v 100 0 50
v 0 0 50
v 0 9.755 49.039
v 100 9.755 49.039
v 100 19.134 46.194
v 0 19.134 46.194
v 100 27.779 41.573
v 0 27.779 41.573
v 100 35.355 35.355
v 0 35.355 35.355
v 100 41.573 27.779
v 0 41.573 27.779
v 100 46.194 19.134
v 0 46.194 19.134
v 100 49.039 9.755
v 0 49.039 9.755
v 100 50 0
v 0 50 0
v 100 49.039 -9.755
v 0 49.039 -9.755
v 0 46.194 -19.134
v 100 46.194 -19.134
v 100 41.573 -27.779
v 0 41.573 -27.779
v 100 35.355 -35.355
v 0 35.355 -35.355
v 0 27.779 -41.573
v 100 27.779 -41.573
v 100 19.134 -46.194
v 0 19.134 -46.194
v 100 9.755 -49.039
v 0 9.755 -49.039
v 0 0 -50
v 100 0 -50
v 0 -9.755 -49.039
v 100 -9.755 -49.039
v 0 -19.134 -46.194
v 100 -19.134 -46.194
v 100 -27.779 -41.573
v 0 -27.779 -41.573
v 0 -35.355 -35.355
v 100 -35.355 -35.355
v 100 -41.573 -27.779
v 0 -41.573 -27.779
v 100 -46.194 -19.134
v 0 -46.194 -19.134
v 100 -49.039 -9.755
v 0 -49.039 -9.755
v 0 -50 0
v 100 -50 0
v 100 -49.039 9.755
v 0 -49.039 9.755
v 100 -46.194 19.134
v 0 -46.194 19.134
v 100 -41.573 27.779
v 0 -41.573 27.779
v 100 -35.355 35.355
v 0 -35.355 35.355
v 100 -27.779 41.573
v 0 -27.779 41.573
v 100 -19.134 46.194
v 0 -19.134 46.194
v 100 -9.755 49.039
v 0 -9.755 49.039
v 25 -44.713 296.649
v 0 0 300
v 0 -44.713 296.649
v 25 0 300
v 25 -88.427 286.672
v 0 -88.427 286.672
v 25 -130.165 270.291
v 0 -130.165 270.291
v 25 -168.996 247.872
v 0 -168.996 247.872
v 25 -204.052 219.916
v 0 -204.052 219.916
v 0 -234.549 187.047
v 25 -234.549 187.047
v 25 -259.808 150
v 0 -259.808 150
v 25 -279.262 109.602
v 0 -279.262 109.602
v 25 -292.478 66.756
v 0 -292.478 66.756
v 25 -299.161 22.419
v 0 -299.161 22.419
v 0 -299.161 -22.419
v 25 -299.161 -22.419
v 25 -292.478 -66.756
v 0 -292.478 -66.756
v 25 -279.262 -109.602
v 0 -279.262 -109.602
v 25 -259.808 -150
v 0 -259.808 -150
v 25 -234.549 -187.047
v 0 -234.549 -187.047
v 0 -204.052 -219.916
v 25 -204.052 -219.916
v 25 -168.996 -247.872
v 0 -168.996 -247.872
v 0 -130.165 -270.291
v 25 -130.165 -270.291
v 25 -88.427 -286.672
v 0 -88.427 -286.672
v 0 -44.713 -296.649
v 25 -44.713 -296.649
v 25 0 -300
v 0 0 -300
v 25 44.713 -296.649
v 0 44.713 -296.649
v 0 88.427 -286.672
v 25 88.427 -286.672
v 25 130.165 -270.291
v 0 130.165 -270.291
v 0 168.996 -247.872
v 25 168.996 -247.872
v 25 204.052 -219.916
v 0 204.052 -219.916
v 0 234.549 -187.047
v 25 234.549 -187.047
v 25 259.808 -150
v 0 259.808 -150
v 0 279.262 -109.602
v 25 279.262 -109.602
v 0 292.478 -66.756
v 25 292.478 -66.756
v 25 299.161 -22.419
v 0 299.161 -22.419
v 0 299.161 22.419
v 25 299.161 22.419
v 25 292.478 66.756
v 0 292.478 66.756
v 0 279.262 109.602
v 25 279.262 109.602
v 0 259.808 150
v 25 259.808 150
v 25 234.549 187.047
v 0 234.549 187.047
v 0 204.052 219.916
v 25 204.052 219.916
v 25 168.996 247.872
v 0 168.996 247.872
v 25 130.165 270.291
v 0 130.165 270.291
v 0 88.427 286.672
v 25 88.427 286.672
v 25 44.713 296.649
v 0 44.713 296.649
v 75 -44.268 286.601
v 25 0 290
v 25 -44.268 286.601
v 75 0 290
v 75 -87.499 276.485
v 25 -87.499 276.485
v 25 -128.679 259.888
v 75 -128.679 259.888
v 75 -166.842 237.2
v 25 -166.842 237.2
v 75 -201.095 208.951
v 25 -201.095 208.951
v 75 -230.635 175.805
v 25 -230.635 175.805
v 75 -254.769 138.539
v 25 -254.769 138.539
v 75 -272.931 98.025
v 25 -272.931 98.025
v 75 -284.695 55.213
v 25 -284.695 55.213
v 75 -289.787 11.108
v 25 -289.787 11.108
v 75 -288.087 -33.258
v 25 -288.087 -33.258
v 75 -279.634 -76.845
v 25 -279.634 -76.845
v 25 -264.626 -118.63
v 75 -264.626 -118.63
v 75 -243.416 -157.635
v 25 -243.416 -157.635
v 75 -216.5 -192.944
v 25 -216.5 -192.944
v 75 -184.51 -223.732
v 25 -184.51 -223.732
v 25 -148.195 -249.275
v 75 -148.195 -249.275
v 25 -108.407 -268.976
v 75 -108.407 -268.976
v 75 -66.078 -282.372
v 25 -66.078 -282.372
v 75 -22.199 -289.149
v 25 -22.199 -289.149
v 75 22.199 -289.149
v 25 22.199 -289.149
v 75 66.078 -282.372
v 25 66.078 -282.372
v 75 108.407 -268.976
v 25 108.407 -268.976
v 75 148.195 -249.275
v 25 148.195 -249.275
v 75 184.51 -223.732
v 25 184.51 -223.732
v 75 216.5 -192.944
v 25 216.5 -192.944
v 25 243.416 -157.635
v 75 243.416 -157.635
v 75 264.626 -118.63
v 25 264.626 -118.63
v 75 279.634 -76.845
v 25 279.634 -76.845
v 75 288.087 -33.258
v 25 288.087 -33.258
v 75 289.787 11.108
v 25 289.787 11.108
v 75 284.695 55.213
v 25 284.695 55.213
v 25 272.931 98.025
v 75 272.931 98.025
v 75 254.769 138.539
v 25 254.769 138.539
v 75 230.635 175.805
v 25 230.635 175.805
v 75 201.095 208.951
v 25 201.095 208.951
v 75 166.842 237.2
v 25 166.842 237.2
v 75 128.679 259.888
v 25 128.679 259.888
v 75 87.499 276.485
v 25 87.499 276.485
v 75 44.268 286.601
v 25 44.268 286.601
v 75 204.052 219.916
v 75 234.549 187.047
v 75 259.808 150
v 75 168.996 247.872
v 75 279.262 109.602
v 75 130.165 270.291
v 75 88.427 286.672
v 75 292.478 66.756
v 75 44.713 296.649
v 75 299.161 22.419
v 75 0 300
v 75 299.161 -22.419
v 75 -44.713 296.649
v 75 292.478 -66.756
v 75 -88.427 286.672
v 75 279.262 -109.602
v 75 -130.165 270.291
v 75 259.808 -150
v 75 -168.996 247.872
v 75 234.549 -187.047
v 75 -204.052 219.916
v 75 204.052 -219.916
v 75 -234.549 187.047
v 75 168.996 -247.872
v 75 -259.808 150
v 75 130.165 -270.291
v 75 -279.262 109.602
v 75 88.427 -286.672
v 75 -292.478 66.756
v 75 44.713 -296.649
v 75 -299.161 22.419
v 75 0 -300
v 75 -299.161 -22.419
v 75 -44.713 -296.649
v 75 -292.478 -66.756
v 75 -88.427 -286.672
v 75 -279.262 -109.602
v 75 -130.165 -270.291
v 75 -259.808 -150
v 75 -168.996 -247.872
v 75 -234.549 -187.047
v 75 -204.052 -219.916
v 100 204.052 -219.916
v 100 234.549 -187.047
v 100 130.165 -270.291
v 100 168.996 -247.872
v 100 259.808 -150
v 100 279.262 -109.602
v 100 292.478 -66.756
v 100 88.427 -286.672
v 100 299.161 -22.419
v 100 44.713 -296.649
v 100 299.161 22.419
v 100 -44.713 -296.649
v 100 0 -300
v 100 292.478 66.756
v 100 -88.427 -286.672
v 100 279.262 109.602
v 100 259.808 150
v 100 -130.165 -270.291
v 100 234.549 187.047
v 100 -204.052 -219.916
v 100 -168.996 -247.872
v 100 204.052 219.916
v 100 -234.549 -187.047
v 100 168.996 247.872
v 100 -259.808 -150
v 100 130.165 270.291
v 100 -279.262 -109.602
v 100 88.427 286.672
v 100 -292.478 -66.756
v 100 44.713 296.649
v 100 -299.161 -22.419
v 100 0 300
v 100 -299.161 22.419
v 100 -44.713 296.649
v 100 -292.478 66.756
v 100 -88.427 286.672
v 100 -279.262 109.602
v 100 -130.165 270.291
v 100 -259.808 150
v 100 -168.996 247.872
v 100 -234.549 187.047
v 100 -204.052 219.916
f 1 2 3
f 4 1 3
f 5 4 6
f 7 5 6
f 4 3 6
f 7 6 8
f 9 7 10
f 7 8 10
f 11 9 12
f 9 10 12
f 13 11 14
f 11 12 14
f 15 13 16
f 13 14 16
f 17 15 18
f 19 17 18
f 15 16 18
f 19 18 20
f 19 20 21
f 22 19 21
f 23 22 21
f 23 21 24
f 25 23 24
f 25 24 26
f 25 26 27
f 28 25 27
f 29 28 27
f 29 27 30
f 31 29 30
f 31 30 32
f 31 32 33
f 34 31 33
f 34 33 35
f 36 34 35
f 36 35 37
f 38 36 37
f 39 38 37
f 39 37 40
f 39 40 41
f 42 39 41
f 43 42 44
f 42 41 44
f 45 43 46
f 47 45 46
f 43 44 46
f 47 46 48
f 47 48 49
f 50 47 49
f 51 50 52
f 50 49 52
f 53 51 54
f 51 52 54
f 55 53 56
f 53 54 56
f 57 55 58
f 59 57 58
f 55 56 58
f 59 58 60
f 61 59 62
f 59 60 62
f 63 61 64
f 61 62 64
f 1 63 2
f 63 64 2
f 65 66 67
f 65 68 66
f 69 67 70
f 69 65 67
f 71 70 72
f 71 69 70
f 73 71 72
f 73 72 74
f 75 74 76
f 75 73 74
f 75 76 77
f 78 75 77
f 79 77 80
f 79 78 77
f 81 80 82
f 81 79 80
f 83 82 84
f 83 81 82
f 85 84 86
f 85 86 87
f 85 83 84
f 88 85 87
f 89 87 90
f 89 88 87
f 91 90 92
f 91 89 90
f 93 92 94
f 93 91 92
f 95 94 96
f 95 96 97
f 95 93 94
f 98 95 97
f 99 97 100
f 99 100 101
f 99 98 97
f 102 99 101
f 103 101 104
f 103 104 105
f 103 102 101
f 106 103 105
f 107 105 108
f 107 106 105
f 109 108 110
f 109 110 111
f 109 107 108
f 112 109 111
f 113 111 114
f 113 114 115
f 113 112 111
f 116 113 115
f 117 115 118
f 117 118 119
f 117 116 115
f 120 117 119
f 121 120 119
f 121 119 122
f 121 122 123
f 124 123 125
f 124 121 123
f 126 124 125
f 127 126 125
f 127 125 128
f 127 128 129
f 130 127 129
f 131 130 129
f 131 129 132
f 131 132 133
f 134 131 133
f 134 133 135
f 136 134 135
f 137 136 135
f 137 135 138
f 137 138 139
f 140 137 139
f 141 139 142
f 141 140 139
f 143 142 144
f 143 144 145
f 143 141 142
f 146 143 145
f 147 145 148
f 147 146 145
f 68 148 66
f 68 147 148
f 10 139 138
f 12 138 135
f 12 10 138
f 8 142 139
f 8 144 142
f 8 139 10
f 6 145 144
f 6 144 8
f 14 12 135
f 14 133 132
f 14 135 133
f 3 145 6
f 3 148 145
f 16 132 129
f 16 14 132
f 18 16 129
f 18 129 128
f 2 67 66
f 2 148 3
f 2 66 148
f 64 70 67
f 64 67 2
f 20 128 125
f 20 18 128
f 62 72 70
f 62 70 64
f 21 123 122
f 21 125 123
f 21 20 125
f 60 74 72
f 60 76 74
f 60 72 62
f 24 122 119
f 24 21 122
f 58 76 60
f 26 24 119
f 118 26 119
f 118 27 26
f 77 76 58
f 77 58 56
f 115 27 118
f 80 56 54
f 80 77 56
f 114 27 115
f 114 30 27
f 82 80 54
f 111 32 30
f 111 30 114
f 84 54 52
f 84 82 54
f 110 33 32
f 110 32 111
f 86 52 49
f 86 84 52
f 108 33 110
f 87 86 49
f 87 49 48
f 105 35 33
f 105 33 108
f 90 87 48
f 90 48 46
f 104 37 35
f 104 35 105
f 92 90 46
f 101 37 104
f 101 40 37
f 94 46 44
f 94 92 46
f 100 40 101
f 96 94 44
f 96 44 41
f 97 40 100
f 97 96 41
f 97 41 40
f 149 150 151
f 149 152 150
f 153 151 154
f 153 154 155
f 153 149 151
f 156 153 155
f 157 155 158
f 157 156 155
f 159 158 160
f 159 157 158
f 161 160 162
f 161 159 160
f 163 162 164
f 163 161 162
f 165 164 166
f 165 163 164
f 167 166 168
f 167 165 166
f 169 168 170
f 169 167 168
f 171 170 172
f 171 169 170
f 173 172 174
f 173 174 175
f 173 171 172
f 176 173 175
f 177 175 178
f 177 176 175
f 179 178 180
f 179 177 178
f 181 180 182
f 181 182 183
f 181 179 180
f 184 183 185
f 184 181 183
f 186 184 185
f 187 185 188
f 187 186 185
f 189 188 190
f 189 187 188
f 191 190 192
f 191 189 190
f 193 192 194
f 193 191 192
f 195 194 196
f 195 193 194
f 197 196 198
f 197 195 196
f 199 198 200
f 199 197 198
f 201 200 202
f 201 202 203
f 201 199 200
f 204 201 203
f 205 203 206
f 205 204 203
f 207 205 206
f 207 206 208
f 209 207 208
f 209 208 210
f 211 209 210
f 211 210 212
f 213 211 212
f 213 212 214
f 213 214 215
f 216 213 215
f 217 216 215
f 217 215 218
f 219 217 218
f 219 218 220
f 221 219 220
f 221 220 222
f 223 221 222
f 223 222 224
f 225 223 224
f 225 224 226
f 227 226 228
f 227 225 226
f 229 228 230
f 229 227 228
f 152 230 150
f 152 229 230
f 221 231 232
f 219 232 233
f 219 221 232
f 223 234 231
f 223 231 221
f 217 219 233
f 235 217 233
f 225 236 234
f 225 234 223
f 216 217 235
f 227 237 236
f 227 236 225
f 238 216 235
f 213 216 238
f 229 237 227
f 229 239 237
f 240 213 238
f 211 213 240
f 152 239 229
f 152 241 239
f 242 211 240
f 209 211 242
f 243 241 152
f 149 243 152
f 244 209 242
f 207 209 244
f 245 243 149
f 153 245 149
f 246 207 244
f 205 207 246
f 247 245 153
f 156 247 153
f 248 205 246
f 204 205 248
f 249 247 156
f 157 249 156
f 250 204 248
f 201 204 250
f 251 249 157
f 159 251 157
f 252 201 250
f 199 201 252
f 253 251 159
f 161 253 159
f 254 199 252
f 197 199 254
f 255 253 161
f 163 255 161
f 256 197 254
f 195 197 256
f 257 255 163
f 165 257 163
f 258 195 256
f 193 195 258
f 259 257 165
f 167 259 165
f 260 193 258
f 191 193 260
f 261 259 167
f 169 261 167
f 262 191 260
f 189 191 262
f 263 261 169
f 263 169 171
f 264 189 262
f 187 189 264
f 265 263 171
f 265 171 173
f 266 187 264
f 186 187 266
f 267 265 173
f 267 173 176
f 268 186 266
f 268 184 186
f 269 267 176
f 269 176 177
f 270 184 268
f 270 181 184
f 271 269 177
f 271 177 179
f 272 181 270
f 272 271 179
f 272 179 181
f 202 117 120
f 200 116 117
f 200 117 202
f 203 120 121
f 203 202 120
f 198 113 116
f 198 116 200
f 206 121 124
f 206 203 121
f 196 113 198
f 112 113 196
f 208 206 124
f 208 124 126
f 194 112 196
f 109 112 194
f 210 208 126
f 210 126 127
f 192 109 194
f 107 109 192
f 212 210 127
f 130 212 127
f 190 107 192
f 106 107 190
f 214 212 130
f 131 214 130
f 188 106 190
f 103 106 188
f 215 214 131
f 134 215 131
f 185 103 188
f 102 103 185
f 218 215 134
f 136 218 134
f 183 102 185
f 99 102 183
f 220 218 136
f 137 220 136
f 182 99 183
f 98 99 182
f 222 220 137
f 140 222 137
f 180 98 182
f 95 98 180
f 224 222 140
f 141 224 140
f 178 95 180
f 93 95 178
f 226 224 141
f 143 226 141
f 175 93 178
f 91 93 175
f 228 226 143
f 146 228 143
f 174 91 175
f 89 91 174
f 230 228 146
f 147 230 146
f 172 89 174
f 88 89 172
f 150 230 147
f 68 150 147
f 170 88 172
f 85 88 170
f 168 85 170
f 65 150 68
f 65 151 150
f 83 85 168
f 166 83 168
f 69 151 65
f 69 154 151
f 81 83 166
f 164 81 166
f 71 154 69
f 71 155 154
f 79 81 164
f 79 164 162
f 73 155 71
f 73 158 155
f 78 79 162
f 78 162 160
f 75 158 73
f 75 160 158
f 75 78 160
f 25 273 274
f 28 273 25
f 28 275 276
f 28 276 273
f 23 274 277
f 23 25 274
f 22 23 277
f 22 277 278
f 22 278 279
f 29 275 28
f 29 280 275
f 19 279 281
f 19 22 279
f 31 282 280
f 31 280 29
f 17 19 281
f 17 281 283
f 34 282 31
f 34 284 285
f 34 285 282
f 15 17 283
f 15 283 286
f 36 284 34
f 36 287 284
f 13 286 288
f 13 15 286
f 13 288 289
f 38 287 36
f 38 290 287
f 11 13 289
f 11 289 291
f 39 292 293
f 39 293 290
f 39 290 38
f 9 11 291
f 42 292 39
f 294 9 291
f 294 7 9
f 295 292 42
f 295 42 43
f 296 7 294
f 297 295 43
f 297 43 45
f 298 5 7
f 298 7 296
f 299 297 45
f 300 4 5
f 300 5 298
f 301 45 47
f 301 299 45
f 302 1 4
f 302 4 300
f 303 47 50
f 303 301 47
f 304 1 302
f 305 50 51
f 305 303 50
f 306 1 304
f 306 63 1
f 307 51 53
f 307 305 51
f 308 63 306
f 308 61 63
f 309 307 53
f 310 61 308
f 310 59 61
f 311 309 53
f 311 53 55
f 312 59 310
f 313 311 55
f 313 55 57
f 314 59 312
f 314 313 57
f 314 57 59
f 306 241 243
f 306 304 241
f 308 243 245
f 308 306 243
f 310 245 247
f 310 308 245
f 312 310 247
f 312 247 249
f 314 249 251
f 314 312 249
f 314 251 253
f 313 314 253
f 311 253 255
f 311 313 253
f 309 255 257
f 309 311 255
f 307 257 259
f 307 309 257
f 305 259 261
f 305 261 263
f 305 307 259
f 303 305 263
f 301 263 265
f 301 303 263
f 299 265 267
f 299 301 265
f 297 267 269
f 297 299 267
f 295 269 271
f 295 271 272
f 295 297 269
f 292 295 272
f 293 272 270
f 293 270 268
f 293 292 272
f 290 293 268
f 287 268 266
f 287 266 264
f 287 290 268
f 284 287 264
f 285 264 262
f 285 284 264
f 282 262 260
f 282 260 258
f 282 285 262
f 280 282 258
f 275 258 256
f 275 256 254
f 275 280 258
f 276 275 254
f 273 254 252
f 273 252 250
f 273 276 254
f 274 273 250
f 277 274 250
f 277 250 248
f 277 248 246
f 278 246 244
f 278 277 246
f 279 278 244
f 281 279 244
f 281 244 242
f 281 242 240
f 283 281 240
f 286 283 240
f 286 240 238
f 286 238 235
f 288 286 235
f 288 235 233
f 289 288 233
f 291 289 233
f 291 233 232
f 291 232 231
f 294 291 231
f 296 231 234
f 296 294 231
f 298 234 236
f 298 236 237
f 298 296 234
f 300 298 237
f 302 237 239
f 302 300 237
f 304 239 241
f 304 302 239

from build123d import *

# Parameters (mm, degrees)
SKETCH2_R          = 50
CUT_EXTRUDE1_DEPTH = 436.889894354


with BuildPart() as part:
    # Sketch1 → Revolve1 (revolve)
    with BuildSketch(Plane.XY, mode=Mode.PRIVATE) as revolve1_sk:
        Polygon((0, 0), (0, 300), (25, 300), (25, 290), (75, 290), (75, 300), (100, 300), (100, 0), align=None)
    revolve(revolve1_sk.sketch.rotate(Axis((0, 0, 0), (1, 0, 0)), 90), axis=Axis((0, 0, 0), (1, 0, 0)))

    # Sketch2 → Cut-Extrude1 (cut, through all)
    with BuildSketch(Plane.ZY):
        Circle(SKETCH2_R)
    extrude(amount=-CUT_EXTRUDE1_DEPTH, mode=Mode.SUBTRACT)


solid = part.part
